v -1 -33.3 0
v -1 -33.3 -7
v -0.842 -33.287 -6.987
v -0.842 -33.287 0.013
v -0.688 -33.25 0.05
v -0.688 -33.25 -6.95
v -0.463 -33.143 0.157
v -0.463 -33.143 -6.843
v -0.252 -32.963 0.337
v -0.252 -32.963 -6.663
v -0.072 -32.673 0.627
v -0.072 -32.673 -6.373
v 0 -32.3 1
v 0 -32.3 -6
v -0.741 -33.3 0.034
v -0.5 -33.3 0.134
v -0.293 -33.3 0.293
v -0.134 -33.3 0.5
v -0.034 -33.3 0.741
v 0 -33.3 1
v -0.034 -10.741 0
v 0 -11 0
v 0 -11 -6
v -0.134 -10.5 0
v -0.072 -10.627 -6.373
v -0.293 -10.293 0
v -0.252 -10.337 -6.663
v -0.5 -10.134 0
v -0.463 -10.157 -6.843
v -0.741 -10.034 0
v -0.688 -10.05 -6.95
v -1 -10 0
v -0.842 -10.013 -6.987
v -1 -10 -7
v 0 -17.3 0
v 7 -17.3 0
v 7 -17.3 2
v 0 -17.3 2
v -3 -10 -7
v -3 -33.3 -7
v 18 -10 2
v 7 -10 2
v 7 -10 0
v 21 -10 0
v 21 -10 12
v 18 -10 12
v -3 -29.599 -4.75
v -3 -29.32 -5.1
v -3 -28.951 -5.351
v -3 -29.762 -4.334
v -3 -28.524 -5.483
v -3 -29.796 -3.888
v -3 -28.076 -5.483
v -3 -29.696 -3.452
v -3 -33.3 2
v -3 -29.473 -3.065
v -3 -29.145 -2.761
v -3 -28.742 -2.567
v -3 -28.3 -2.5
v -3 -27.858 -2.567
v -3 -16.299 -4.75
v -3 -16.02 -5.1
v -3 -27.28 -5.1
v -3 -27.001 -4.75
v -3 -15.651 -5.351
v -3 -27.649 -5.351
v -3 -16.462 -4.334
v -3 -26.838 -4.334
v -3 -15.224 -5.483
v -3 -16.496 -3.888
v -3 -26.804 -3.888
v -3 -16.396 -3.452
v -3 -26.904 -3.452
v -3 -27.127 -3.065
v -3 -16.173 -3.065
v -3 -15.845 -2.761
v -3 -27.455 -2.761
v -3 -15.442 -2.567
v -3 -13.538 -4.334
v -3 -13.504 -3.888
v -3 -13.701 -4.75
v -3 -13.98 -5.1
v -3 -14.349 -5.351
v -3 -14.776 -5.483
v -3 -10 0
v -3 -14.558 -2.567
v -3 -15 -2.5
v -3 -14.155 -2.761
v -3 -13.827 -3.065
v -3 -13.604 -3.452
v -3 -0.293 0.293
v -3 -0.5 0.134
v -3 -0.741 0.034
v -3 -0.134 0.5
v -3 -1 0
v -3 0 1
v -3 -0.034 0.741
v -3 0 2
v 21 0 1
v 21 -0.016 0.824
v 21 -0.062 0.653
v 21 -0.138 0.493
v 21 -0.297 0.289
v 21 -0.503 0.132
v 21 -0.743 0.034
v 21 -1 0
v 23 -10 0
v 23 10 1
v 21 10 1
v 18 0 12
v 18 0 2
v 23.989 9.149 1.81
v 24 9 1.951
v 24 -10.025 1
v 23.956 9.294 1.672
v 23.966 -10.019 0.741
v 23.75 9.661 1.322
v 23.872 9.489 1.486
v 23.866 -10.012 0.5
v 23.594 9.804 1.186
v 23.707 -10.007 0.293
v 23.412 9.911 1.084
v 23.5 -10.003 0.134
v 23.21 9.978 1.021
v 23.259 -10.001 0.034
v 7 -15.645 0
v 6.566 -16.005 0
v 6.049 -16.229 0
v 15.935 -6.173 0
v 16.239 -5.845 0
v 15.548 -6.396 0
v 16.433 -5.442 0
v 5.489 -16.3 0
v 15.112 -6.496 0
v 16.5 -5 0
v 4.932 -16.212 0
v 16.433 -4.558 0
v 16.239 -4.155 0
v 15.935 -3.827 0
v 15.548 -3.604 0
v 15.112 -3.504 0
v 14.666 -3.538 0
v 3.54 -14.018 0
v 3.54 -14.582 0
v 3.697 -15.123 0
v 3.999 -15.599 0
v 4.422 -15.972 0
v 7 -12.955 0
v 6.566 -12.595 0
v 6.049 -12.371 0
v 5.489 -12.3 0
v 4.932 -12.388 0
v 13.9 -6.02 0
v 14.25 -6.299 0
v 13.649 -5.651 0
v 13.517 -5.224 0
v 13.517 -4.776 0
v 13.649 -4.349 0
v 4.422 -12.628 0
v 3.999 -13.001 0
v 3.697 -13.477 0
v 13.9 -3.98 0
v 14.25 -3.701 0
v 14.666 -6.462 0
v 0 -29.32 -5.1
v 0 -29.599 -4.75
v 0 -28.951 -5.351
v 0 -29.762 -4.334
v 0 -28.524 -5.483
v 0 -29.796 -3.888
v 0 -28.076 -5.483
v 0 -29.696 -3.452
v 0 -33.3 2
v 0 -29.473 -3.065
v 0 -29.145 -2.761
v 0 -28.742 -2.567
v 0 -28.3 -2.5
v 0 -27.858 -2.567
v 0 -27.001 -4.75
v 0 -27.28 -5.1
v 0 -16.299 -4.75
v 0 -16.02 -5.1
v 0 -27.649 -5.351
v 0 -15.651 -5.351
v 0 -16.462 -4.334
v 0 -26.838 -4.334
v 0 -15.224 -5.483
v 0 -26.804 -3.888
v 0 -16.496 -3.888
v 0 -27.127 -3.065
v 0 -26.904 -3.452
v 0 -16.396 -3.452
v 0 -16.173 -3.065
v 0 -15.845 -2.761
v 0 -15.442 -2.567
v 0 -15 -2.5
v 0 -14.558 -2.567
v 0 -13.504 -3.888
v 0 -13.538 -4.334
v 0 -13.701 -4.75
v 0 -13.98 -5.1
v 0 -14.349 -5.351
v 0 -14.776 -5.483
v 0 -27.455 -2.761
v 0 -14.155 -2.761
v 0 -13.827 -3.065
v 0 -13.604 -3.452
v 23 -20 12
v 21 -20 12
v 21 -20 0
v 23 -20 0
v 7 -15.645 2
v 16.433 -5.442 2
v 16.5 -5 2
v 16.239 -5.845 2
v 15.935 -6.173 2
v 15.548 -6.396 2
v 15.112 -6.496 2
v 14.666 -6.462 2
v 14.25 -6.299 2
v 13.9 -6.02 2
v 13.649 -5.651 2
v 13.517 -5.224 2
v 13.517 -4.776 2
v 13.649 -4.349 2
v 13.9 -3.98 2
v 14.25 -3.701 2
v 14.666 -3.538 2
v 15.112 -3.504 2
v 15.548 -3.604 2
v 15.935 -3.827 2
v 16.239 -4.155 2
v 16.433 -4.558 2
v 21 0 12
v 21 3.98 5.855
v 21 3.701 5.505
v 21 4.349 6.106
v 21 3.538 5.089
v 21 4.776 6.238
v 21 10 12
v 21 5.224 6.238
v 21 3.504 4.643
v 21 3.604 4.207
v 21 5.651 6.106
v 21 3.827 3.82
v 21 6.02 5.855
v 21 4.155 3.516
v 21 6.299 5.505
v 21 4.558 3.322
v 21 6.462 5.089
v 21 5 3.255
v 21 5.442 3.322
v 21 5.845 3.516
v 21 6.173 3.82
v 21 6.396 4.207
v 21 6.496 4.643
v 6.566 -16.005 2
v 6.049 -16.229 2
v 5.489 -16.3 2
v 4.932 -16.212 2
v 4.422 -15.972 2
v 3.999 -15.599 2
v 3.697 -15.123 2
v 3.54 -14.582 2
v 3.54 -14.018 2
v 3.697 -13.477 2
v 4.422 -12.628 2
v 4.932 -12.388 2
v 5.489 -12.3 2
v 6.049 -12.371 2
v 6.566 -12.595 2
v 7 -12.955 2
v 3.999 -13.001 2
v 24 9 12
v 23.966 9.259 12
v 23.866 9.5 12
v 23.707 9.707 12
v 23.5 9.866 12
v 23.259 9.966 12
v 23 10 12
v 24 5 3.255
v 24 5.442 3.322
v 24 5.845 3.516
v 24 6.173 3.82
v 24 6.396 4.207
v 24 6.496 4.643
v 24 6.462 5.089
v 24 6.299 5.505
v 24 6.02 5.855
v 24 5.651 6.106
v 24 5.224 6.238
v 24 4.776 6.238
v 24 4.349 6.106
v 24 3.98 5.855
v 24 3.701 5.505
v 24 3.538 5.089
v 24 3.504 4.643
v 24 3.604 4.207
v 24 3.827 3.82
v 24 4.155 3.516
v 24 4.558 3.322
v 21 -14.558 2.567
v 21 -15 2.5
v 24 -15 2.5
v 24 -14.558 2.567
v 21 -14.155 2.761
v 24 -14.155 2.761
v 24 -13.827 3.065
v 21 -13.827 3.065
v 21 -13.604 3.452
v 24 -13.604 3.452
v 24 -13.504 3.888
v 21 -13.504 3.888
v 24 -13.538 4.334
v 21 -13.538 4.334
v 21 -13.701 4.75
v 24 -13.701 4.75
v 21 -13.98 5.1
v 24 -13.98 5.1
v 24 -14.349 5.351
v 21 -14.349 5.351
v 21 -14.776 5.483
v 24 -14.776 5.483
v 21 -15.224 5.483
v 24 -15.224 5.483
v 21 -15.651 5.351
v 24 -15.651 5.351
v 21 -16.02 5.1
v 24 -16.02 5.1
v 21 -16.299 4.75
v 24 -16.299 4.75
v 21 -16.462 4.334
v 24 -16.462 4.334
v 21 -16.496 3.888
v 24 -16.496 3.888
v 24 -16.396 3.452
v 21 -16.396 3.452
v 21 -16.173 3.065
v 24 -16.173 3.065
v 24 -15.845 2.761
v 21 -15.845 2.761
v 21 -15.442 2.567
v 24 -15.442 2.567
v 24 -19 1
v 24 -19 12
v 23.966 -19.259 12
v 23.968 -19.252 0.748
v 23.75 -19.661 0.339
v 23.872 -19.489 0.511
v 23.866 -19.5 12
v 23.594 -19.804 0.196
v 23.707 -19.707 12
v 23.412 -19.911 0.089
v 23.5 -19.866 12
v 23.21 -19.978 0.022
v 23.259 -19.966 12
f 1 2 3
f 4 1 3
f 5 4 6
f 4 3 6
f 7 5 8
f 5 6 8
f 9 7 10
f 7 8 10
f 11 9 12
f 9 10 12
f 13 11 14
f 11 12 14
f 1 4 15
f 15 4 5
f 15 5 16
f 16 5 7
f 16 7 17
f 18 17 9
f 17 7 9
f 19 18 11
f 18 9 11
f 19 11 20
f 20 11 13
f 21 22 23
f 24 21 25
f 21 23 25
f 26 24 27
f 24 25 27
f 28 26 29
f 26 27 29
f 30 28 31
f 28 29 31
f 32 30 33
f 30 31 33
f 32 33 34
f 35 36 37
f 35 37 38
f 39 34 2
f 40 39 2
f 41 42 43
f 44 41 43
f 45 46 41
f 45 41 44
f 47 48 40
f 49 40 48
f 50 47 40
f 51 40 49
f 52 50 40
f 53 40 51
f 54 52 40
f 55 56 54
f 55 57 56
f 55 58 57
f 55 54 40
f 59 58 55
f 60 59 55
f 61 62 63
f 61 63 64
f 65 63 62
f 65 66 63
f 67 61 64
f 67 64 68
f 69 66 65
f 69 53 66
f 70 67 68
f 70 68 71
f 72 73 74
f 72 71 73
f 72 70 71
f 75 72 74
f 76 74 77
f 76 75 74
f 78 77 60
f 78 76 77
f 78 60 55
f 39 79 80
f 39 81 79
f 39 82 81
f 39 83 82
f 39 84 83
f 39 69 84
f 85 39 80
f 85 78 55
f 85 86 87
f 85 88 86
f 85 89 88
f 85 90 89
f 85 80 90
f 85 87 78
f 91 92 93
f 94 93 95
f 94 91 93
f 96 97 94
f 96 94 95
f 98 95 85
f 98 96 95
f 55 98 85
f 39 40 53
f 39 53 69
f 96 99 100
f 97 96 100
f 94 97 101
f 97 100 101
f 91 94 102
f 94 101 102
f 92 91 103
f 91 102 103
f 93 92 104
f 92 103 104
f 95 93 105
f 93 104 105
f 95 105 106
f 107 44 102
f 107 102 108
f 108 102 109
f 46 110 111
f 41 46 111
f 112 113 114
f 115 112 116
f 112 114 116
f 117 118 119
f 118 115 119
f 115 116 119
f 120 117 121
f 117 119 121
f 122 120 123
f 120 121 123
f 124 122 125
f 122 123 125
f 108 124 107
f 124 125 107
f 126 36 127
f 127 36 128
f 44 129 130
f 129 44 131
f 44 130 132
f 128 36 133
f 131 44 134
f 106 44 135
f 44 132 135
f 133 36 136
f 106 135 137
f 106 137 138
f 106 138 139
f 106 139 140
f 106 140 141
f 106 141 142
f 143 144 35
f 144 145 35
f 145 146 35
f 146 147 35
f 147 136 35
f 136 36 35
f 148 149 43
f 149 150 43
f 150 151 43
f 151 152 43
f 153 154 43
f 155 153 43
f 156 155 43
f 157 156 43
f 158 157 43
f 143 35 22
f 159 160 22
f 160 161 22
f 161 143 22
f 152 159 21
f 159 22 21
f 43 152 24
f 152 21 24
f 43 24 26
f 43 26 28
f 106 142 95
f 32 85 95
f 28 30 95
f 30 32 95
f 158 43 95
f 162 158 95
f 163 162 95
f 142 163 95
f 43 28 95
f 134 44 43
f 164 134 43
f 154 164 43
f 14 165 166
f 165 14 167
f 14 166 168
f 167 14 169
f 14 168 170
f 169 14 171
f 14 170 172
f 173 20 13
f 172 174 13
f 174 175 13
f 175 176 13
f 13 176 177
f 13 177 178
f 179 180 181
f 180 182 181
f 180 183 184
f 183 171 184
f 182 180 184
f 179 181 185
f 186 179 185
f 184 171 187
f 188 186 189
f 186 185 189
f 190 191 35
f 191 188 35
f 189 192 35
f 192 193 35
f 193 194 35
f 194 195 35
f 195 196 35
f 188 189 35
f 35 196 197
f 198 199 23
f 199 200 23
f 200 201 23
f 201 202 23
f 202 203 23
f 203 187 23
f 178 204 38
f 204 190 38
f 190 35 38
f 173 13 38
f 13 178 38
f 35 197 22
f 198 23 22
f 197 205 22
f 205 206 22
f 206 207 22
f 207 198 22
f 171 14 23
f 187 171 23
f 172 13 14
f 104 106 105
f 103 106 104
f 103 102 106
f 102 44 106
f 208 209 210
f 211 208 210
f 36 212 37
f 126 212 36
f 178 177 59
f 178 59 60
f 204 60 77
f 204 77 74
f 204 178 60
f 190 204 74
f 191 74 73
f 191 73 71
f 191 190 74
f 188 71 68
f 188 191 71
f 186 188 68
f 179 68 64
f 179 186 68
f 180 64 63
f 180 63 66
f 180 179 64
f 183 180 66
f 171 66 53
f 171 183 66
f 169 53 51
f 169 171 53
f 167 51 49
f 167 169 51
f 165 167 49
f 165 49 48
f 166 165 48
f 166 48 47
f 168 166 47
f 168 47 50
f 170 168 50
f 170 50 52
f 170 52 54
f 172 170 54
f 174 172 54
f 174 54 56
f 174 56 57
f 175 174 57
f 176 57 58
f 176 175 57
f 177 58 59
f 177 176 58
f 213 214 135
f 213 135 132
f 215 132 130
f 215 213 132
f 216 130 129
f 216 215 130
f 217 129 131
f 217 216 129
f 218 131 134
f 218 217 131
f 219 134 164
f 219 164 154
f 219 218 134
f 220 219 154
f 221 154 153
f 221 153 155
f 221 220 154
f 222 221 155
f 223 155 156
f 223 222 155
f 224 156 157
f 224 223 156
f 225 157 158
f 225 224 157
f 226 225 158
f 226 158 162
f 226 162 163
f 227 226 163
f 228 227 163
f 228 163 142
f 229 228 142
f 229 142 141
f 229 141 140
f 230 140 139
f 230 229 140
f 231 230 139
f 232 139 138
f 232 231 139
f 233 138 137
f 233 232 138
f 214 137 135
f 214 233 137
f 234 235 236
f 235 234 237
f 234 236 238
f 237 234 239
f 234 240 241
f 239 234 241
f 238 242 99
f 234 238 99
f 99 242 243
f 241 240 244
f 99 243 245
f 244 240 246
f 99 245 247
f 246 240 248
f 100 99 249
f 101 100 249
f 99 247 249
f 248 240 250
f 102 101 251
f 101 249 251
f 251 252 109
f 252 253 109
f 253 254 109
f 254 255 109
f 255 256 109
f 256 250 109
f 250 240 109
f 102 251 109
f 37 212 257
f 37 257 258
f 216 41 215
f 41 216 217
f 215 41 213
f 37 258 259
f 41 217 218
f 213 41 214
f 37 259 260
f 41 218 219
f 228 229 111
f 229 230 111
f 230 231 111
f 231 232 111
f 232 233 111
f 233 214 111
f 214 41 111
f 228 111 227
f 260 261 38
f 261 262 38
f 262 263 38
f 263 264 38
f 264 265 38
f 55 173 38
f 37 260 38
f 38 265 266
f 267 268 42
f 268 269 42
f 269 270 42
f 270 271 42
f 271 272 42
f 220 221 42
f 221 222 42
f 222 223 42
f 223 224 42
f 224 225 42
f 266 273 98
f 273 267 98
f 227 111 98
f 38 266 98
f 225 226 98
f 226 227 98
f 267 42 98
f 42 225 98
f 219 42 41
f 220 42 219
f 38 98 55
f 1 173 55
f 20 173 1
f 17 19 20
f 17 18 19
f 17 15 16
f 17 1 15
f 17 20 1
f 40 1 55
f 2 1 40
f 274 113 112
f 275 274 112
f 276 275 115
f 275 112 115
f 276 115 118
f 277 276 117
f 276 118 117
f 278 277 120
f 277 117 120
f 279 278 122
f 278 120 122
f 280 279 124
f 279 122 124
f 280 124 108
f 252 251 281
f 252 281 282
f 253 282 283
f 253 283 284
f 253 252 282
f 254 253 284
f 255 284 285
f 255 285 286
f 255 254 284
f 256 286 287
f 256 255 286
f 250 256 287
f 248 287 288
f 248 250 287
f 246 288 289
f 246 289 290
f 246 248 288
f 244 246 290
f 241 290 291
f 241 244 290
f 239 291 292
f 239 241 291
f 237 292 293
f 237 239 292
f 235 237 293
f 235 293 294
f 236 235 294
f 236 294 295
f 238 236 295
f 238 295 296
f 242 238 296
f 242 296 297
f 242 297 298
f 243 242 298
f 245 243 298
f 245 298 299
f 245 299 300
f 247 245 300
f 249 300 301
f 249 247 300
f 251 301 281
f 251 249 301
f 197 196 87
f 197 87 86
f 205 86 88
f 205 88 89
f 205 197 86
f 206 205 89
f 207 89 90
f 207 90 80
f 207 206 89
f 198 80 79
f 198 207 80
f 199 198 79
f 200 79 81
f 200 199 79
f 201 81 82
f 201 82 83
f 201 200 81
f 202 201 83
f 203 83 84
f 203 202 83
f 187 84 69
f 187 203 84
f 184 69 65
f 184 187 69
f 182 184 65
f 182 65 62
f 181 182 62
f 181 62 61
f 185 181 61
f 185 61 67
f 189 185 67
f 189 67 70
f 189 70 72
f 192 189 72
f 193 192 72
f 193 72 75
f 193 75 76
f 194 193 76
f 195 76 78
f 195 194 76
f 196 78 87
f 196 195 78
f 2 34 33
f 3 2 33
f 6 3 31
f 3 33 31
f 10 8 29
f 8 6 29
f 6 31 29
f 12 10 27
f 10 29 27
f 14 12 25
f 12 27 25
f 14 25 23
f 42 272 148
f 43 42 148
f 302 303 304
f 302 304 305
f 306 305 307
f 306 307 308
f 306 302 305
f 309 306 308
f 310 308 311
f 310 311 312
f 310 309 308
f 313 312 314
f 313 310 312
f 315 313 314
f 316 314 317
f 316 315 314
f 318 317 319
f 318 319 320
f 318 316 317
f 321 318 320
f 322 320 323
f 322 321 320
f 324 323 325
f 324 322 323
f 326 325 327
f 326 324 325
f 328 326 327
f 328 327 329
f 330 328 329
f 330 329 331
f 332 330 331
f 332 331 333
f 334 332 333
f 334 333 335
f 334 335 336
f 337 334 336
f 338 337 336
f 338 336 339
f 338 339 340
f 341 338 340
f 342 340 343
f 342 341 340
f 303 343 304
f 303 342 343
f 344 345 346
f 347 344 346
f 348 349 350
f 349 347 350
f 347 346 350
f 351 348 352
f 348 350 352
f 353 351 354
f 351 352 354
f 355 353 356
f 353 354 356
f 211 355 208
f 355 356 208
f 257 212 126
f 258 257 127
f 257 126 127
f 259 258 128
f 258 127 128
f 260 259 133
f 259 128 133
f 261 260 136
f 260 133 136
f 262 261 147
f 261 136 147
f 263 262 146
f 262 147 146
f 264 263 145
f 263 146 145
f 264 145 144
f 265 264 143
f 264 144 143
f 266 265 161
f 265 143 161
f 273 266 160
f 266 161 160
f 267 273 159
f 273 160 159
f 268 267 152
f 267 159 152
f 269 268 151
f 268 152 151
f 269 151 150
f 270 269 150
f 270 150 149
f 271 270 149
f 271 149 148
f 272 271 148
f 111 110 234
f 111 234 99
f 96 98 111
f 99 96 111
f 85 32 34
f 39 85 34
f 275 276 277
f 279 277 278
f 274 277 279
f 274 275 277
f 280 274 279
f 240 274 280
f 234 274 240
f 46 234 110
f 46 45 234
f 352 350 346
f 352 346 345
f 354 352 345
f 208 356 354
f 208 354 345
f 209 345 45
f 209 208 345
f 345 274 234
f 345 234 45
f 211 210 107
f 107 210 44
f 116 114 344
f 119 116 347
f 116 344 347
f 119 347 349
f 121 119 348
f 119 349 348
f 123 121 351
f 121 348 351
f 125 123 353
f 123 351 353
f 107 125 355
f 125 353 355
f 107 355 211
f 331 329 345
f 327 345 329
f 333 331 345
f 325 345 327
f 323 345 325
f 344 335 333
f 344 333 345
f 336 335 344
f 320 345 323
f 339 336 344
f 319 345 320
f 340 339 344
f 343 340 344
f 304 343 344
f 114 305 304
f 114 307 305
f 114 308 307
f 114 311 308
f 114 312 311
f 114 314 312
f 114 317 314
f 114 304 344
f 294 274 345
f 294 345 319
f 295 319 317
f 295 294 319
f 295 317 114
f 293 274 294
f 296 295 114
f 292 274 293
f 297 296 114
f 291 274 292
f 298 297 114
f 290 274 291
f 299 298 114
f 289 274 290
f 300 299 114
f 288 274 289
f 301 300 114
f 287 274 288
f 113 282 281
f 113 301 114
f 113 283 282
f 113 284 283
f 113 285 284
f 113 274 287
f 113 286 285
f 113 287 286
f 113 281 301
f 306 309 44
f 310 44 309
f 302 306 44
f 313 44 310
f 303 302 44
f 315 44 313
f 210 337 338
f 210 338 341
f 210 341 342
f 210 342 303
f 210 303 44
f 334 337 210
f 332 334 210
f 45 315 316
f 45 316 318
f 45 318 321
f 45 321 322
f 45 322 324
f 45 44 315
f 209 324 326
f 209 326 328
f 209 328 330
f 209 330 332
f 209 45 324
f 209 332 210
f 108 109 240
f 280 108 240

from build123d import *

# Parameters (mm, degrees)
CROQUIS1_W              = 24
CROQUIS1_H              = 33.3
SALIENTE_EXTRUIR2_DEPTH = 7
CROQUIS3_W              = 4
CROQUIS3_H              = 19
CORTAR_EXTRUIR1_DEPTH   = 42.640004803
CROQUIS7_R              = 1.5
SALIENTE_EXTRUIR3_DEPTH = 3
CROQUIS8_W              = 18
CROQUIS8_H              = 10
CROQUIS8_R              = 1.5
SALIENTE_EXTRUIR5_DEPTH = 3
SALIENTE_EXTRUIR6_START = -2
CROQUIS9_W              = 18
CROQUIS9_H              = 10
CROQUIS9_R              = 1.5
SALIENTE_EXTRUIR6_DEPTH = 2
CROQUIS10_W             = 24
CROQUIS10_H             = 10
SALIENTE_EXTRUIR7_DEPTH = 3
CROQUIS11_W             = 19
CROQUIS11_H             = 38
CORTAR_EXTRUIR5_DEPTH   = 57.986752847
CROQUIS15_W             = 7
CROQUIS15_H             = 10
CORTAR_EXTRUIR8_DEPTH   = 59.004223984
CROQUIS16_W             = 7
CROQUIS16_H             = 16
CORTAR_EXTRUIR9_DEPTH   = 2
CROQUIS18_R             = 1.5
CROQUIS18_W             = 24
CROQUIS18_H             = 10
SALIENTE_EXTRUIR8_DEPTH = 3
REDONDEO1_R             = 1
CROQUIS19_W             = 27
CROQUIS19_H             = 19
CORTAR_EXTRUIR11_DEPTH  = 67.973800848
CROQUIS21_R             = 2
CORTAR_EXTRUIR12_DEPTH  = 10
CROQUIS22_W             = 12
CROQUIS22_H             = 11
CORTAR_EXTRUIR13_DEPTH  = 52.792760112


with BuildPart() as part:
    # Croquis1 → Saliente-Extruir2 (new body)
    with BuildSketch(Plane(origin=(0, 0, 0), x_dir=(0, 0, -1), z_dir=(1, 0, 0))):
        with Locations((-12, -16.65)):
            Rectangle(CROQUIS1_W, CROQUIS1_H)
    extrude(amount=SALIENTE_EXTRUIR2_DEPTH)

    # Croquis3 → Cortar-Extruir1 (cut, through all)
    with BuildSketch(Plane(origin=(0, 0, 0), x_dir=(1, 0, 0), z_dir=(0, 1, 0))):
        with Locations((5, -11.5)):
            Rectangle(CROQUIS3_W, CROQUIS3_H)
    extrude(amount=-CORTAR_EXTRUIR1_DEPTH, mode=Mode.SUBTRACT)



with BuildPart() as body_2:
    # Croquis7 → Saliente-Extruir3 (new body)
    with BuildSketch(Plane.ZY):
        Polygon((-7, 0), (-7, -33.3), (0, -33.3), (0, -44.3), (24, -44.3), (24, -33.3), (31, -33.3), (31, 0), align=None)
        with Locations((-4, -28.3)):
            Circle(CROQUIS7_R, mode=Mode.SUBTRACT)
        with Locations((-4, -15)):
            Circle(CROQUIS7_R, mode=Mode.SUBTRACT)
        with Locations((28, -15)):
            Circle(CROQUIS7_R, mode=Mode.SUBTRACT)
        with Locations((28, -28.3)):
            Circle(CROQUIS7_R, mode=Mode.SUBTRACT)
        with Locations((20, -40.3)):
            Circle(CROQUIS7_R, mode=Mode.SUBTRACT)
        with Locations((4, -40.3)):
            Circle(CROQUIS7_R, mode=Mode.SUBTRACT)
    extrude(amount=SALIENTE_EXTRUIR3_DEPTH)


with BuildPart() as part_1:
    add(part.part)

    add(body_2.part)  # Saliente-Extruir5 merges body 2
    # Croquis8 → Saliente-Extruir5 (add)
    with BuildSketch(Plane.XY.offset(24)):
        with Locations((9, -5)):
            Rectangle(CROQUIS8_W, CROQUIS8_H)
        with Locations((15, -5)):
            Circle(CROQUIS8_R, mode=Mode.SUBTRACT)
        with Locations((3, -5)):
            Circle(CROQUIS8_R, mode=Mode.SUBTRACT)
    extrude(amount=-SALIENTE_EXTRUIR5_DEPTH)

    # Croquis9 → Saliente-Extruir6 (add)
    with BuildSketch(Plane(origin=(0, 0, 0), x_dir=(-1, 0, 0), z_dir=(0, 0, -1)).offset(SALIENTE_EXTRUIR6_START)):
        with Locations((-9, -5)):
            Rectangle(CROQUIS9_W, CROQUIS9_H)
        with Locations(Location((-15, -5, 0), (0, 0, 180))):
            Circle(CROQUIS9_R, mode=Mode.SUBTRACT)
    extrude(amount=SALIENTE_EXTRUIR6_DEPTH)

    # Croquis10 → Saliente-Extruir7 (add)
    with BuildSketch(Plane(origin=(18, 0, 0), x_dir=(0, 0, -1), z_dir=(1, 0, 0))):
        with Locations((-12, -5)):
            Rectangle(CROQUIS10_W, CROQUIS10_H)
    extrude(amount=SALIENTE_EXTRUIR7_DEPTH)

    # Croquis11 → Cortar-Extruir5 (cut, through all)
    with BuildSketch(Plane(origin=(3, 0, 0), x_dir=(0, 0, -1), z_dir=(1, 0, 0))):
        with Locations((-11.5, -19)):
            Rectangle(CROQUIS11_W, CROQUIS11_H)
    extrude(amount=-CORTAR_EXTRUIR5_DEPTH, mode=Mode.SUBTRACT)

    # Croquis15 → Cortar-Extruir8 (cut, through all)
    with BuildSketch(Plane(origin=(0, 0, 0), x_dir=(0, 0, -1), z_dir=(1, 0, 0))):
        with Locations((-27.5, -5)):
            Rectangle(CROQUIS15_W, CROQUIS15_H)
        with Locations((3.5, -5)):
            Rectangle(CROQUIS15_W, CROQUIS15_H)
    extrude(amount=-CORTAR_EXTRUIR8_DEPTH, mode=Mode.SUBTRACT)

    # Croquis16 → Cortar-Extruir9 (cut)
    with BuildSketch(Plane(origin=(0, 0, 0), x_dir=(-1, 0, 0), z_dir=(0, 0, -1))):
        with Locations((-3.5, -25.3)):
            Rectangle(CROQUIS16_W, CROQUIS16_H)
    extrude(amount=-CORTAR_EXTRUIR9_DEPTH, mode=Mode.SUBTRACT)

    # Croquis18 → Saliente-Extruir8 (add)
    # profile 1 of 2: a face of its own
    with BuildSketch(Plane(origin=(21, 0, 0), x_dir=(0, 0, -1), z_dir=(1, 0, 0))):
        Polygon((-24, 10), (-24, -10), (0, -10), (-1, 10), align=None)
        with Locations((-20, 5)):
            Circle(CROQUIS18_R, mode=Mode.SUBTRACT)
        with Locations((-4.754996879, 5)):
            Circle(CROQUIS18_R, mode=Mode.SUBTRACT)
    # profile 2 of 2: a face of its own
    with BuildSketch(Plane(origin=(21, 0, 0), x_dir=(0, 0, -1), z_dir=(1, 0, 0))):
        with Locations((-12, -15)):
            Rectangle(CROQUIS18_W, CROQUIS18_H)
        with Locations((-20, -15)):
            Circle(CROQUIS18_R, mode=Mode.SUBTRACT)
        with Locations((-4, -15)):
            Circle(CROQUIS18_R, mode=Mode.SUBTRACT)
    extrude(amount=SALIENTE_EXTRUIR8_DEPTH)

    # Redondeo1
    # the kernel refuses this fillet: 1 mm, written as the material it takes off along each edge
    with BuildSketch(Plane(origin=(0, -33.3, 31), x_dir=(0, 0, -1), z_dir=(0, 1, 0)), Plane(origin=(0, -10, -7), x_dir=(0, 0, 1), z_dir=(0, -1, 0))) as redondeo1_piece_1:
        with BuildLine():
            CenterArc((REDONDEO1_R, REDONDEO1_R), REDONDEO1_R, 180, 90)
            Line((0, REDONDEO1_R), (-REDONDEO1_R * 0.02, REDONDEO1_R))
            Line((-REDONDEO1_R * 0.02, REDONDEO1_R), (-REDONDEO1_R * 0.02, -REDONDEO1_R * 0.02))
            Line((-REDONDEO1_R * 0.02, -REDONDEO1_R * 0.02), (REDONDEO1_R, -REDONDEO1_R * 0.02))
            Line((REDONDEO1_R, -REDONDEO1_R * 0.02), (REDONDEO1_R, 0))
        make_face()
    extrude(amount=23.3, mode=Mode.SUBTRACT)
    with BuildSketch(Plane(origin=(0, -10, 24), x_dir=(-1, 0, 0), z_dir=(0, 0, 1)), Plane(origin=(0, -10, -7), x_dir=(-1, 0, 0), z_dir=(0, 0, 1)), Plane(origin=(0, -33.3, 24), x_dir=(0, 1, 0), z_dir=(0, 0, 1)), Plane(origin=(0, -33.3, -7), x_dir=(0, 1, 0), z_dir=(0, 0, 1))) as redondeo1_piece_2:
        with BuildLine():
            CenterArc((REDONDEO1_R, REDONDEO1_R), REDONDEO1_R, 180, 90)
            Line((0, REDONDEO1_R), (-REDONDEO1_R * 0.02, REDONDEO1_R))
            Line((-REDONDEO1_R * 0.02, REDONDEO1_R), (-REDONDEO1_R * 0.02, -REDONDEO1_R * 0.02))
            Line((-REDONDEO1_R * 0.02, -REDONDEO1_R * 0.02), (REDONDEO1_R, -REDONDEO1_R * 0.02))
            Line((REDONDEO1_R, -REDONDEO1_R * 0.02), (REDONDEO1_R, 0))
        make_face()
    extrude(amount=7, mode=Mode.SUBTRACT)
    with BuildSketch(Plane(origin=(24, -20, 24), x_dir=(-1, 0, 0), z_dir=(0, 1, 0))) as redondeo1_piece_3:
        with BuildLine():
            CenterArc((REDONDEO1_R, -REDONDEO1_R), REDONDEO1_R, 90, 90)
            Line((0, -REDONDEO1_R), (-REDONDEO1_R * 0.02, -REDONDEO1_R))
            Line((-REDONDEO1_R * 0.02, -REDONDEO1_R), (-REDONDEO1_R * 0.02, REDONDEO1_R * 0.02))
            Line((-REDONDEO1_R * 0.02, REDONDEO1_R * 0.02), (REDONDEO1_R, REDONDEO1_R * 0.02))
            Line((REDONDEO1_R, REDONDEO1_R * 0.02), (REDONDEO1_R, 0))
        make_face()
    extrude(amount=30, mode=Mode.SUBTRACT)
    with BuildSketch(Plane(origin=(24, -20, 0), x_dir=(0, 0, 1), z_dir=(0, 1, 0))) as redondeo1_piece_4_section:
        with BuildLine():
            CenterArc((REDONDEO1_R, -REDONDEO1_R), REDONDEO1_R, 90, 90)
            Line((0, -REDONDEO1_R), (-REDONDEO1_R * 0.02, -REDONDEO1_R))
            Line((-REDONDEO1_R * 0.02, -REDONDEO1_R), (-REDONDEO1_R * 0.02, REDONDEO1_R * 0.02))
            Line((-REDONDEO1_R * 0.02, REDONDEO1_R * 0.02), (REDONDEO1_R, REDONDEO1_R * 0.02))
            Line((REDONDEO1_R, REDONDEO1_R * 0.02), (REDONDEO1_R, 0))
        make_face()
    redondeo1_piece_4 = extrude(amount=12.5, mode=Mode.PRIVATE)
    redondeo1_piece_4 = split(redondeo1_piece_4, bisect_by=Plane(origin=(23.783903018, -14.02846616, -0.201423308), z_dir=(0, -0.049937616943892635, 0.9987523388778446)), keep=Keep.TOP, mode=Mode.PRIVATE)
    add(redondeo1_piece_4, mode=Mode.SUBTRACT)
    with BuildSketch(Plane(origin=(24, 10, -1.5), x_dir=(-1, 0, 0), z_dir=(0, 0, 1))) as redondeo1_piece_5_section:
        with BuildLine():
            CenterArc((REDONDEO1_R, REDONDEO1_R), REDONDEO1_R, 180, 90)
            Line((0, REDONDEO1_R), (-REDONDEO1_R * 0.02, REDONDEO1_R))
            Line((-REDONDEO1_R * 0.02, REDONDEO1_R), (-REDONDEO1_R * 0.02, -REDONDEO1_R * 0.02))
            Line((-REDONDEO1_R * 0.02, -REDONDEO1_R * 0.02), (REDONDEO1_R, -REDONDEO1_R * 0.02))
            Line((REDONDEO1_R, -REDONDEO1_R * 0.02), (REDONDEO1_R, 0))
        make_face()
    redondeo1_piece_5 = extrude(amount=25.5, mode=Mode.PRIVATE)
    redondeo1_piece_5 = split(redondeo1_piece_5, bisect_by=Plane(origin=(23.773664545, 10.347352398, 1.01736762), z_dir=(0, -0.049937616943892635, 0.9987523388778446)), keep=Keep.TOP, mode=Mode.PRIVATE)
    add(redondeo1_piece_5, mode=Mode.SUBTRACT)
    with BuildSketch(Plane(origin=(24, -20, 24), x_dir=(0, 1, 0), z_dir=(0, 0, -1)), Plane(origin=(-3, 0, 24), x_dir=(0, 0, -1), z_dir=(1, 0, 0)), Plane(origin=(21, 0, 0), x_dir=(0, 0, 1), z_dir=(-1, 0, 0))) as redondeo1_piece_6:
        with BuildLine():
            CenterArc((REDONDEO1_R, -REDONDEO1_R), REDONDEO1_R, 90, 90)
            Line((0, -REDONDEO1_R), (-REDONDEO1_R * 0.02, -REDONDEO1_R))
            Line((-REDONDEO1_R * 0.02, -REDONDEO1_R), (-REDONDEO1_R * 0.02, REDONDEO1_R * 0.02))
            Line((-REDONDEO1_R * 0.02, REDONDEO1_R * 0.02), (REDONDEO1_R, REDONDEO1_R * 0.02))
            Line((REDONDEO1_R, REDONDEO1_R * 0.02), (REDONDEO1_R, 0))
        make_face()
    extrude(amount=24, mode=Mode.SUBTRACT)
    with BuildSketch(Plane(origin=(24, -12.496880847, -0.124844042), x_dir=(-1, 0, 0), z_dir=(0, 0.9987523388778446, 0.049937616943892635))) as redondeo1_piece_7_section:
        with BuildLine():
            CenterArc((REDONDEO1_R, REDONDEO1_R), REDONDEO1_R, 180, 90)
            Line((0, REDONDEO1_R), (-REDONDEO1_R * 0.02, REDONDEO1_R))
            Line((-REDONDEO1_R * 0.02, REDONDEO1_R), (-REDONDEO1_R * 0.02, -REDONDEO1_R * 0.02))
            Line((-REDONDEO1_R * 0.02, -REDONDEO1_R * 0.02), (REDONDEO1_R, -REDONDEO1_R * 0.02))
            Line((REDONDEO1_R, -REDONDEO1_R * 0.02), (REDONDEO1_R, 0))
        make_face()
    redondeo1_piece_7 = extrude(amount=25.024984395, mode=Mode.PRIVATE)
    redondeo1_piece_7 = split(redondeo1_piece_7, bisect_by=Plane(origin=(23.779237021, -0.936247577, 0), z_dir=(0, 0, 1)), keep=Keep.TOP, mode=Mode.PRIVATE)
    redondeo1_piece_7 = split(redondeo1_piece_7, bisect_by=Plane(origin=(23.779237021, 10, 0.686324779), z_dir=(0, -1, 0)), keep=Keep.TOP, mode=Mode.PRIVATE)
    add(redondeo1_piece_7, mode=Mode.SUBTRACT)
    with BuildSketch(Plane(origin=(7, -33.3, 24), x_dir=(-1, 0, 0), z_dir=(0, 1, 0))) as redondeo1_piece_8:
        with BuildLine():
            CenterArc((REDONDEO1_R, -REDONDEO1_R), REDONDEO1_R, 90, 90)
            Line((0, -REDONDEO1_R), (-REDONDEO1_R * 0.02, -REDONDEO1_R))
            Line((-REDONDEO1_R * 0.02, -REDONDEO1_R), (-REDONDEO1_R * 0.02, REDONDEO1_R * 0.02))
            Line((-REDONDEO1_R * 0.02, REDONDEO1_R * 0.02), (REDONDEO1_R, REDONDEO1_R * 0.02))
            Line((REDONDEO1_R, REDONDEO1_R * 0.02), (REDONDEO1_R, 0))
        make_face()
    extrude(amount=23.3, mode=Mode.SUBTRACT)
    with BuildSketch(Plane(origin=(7, -10, 24), x_dir=(0, 1, 0), z_dir=(1, 0, 0))) as redondeo1_piece_9:
        with BuildLine():
            CenterArc((REDONDEO1_R, -REDONDEO1_R), REDONDEO1_R, 90, 90)
            Line((0, -REDONDEO1_R), (-REDONDEO1_R * 0.02, -REDONDEO1_R))
            Line((-REDONDEO1_R * 0.02, -REDONDEO1_R), (-REDONDEO1_R * 0.02, REDONDEO1_R * 0.02))
            Line((-REDONDEO1_R * 0.02, REDONDEO1_R * 0.02), (REDONDEO1_R, REDONDEO1_R * 0.02))
            Line((REDONDEO1_R, REDONDEO1_R * 0.02), (REDONDEO1_R, 0))
        make_face()
    extrude(amount=14, mode=Mode.SUBTRACT)
    with BuildSketch(Plane(origin=(0, -33.3, 0), x_dir=(0, 0, 1), z_dir=(0, -1, 0))) as redondeo1_piece_10:
        with BuildLine():
            CenterArc((REDONDEO1_R, REDONDEO1_R), REDONDEO1_R, 180, 90)
            Line((0, REDONDEO1_R), (-REDONDEO1_R * 0.02, REDONDEO1_R))
            Line((-REDONDEO1_R * 0.02, REDONDEO1_R), (-REDONDEO1_R * 0.02, -REDONDEO1_R * 0.02))
            Line((-REDONDEO1_R * 0.02, -REDONDEO1_R * 0.02), (REDONDEO1_R, -REDONDEO1_R * 0.02))
            Line((REDONDEO1_R, -REDONDEO1_R * 0.02), (REDONDEO1_R, 0))
        make_face()
    extrude(amount=11, mode=Mode.SUBTRACT)
    with BuildSketch(Plane(origin=(0, -44.3, 0), x_dir=(0, 1, 0), z_dir=(0, 0, 1))) as redondeo1_piece_11:
        with BuildLine():
            CenterArc((REDONDEO1_R, REDONDEO1_R), REDONDEO1_R, 180, 90)
            Line((0, REDONDEO1_R), (-REDONDEO1_R * 0.02, REDONDEO1_R))
            Line((-REDONDEO1_R * 0.02, REDONDEO1_R), (-REDONDEO1_R * 0.02, -REDONDEO1_R * 0.02))
            Line((-REDONDEO1_R * 0.02, -REDONDEO1_R * 0.02), (REDONDEO1_R, -REDONDEO1_R * 0.02))
            Line((REDONDEO1_R, -REDONDEO1_R * 0.02), (REDONDEO1_R, 0))
        make_face()
    extrude(amount=24, mode=Mode.SUBTRACT)
    with BuildSketch(Plane(origin=(0, -35.8, 31), x_dir=(0, 0, -1), z_dir=(0, 1, 0))) as redondeo1_piece_12a_section:
        with BuildLine():
            CenterArc((REDONDEO1_R, REDONDEO1_R), REDONDEO1_R, 180, 90)
            Line((0, REDONDEO1_R), (-REDONDEO1_R * 0.02, REDONDEO1_R))
            Line((-REDONDEO1_R * 0.02, REDONDEO1_R), (-REDONDEO1_R * 0.02, -REDONDEO1_R * 0.02))
            Line((-REDONDEO1_R * 0.02, -REDONDEO1_R * 0.02), (REDONDEO1_R, -REDONDEO1_R * 0.02))
            Line((REDONDEO1_R, -REDONDEO1_R * 0.02), (REDONDEO1_R, 0))
        make_face()
    redondeo1_piece_12a = extrude(amount=25.8, mode=Mode.PRIVATE)
    redondeo1_piece_12a = split(redondeo1_piece_12a, bisect_by=Plane(origin=(-0.226395114, -33.3, 30.773604886), z_dir=(0, -1, 0)), keep=Keep.TOP, mode=Mode.PRIVATE)
    with BuildSketch(Plane(origin=(0, -33.3, 24), x_dir=(0, 1, 0), z_dir=(0, 0, 1))) as redondeo1_piece_12b_section:
        with BuildLine():
            CenterArc((REDONDEO1_R, REDONDEO1_R), REDONDEO1_R, 180, 90)
            Line((0, REDONDEO1_R), (-REDONDEO1_R * 0.02, REDONDEO1_R))
            Line((-REDONDEO1_R * 0.02, REDONDEO1_R), (-REDONDEO1_R * 0.02, -REDONDEO1_R * 0.02))
            Line((-REDONDEO1_R * 0.02, -REDONDEO1_R * 0.02), (REDONDEO1_R, -REDONDEO1_R * 0.02))
            Line((REDONDEO1_R, -REDONDEO1_R * 0.02), (REDONDEO1_R, 0))
        make_face()
    redondeo1_piece_12b = extrude(amount=9.5, mode=Mode.PRIVATE)
    redondeo1_piece_12b = split(redondeo1_piece_12b, bisect_by=Plane(origin=(-0.226395114, -33.073604886, 31), z_dir=(0, 0, 1)), keep=Keep.TOP, mode=Mode.PRIVATE)
    redondeo1_piece_12 = redondeo1_piece_12a & redondeo1_piece_12b
    add(redondeo1_piece_12, mode=Mode.SUBTRACT)
    with BuildSketch(Plane(origin=(0, -10, 24), x_dir=(-1, 0, 0), z_dir=(0, 0, 1))) as redondeo1_piece_13a_section:
        with BuildLine():
            CenterArc((REDONDEO1_R, REDONDEO1_R), REDONDEO1_R, 180, 90)
            Line((0, REDONDEO1_R), (-REDONDEO1_R * 0.02, REDONDEO1_R))
            Line((-REDONDEO1_R * 0.02, REDONDEO1_R), (-REDONDEO1_R * 0.02, -REDONDEO1_R * 0.02))
            Line((-REDONDEO1_R * 0.02, -REDONDEO1_R * 0.02), (REDONDEO1_R, -REDONDEO1_R * 0.02))
            Line((REDONDEO1_R, -REDONDEO1_R * 0.02), (REDONDEO1_R, 0))
        make_face()
    redondeo1_piece_13a = extrude(amount=9.5, mode=Mode.PRIVATE)
    redondeo1_piece_13a = split(redondeo1_piece_13a, bisect_by=Plane(origin=(-0.226395114, -10.226395114, 31), z_dir=(0, 0, 1)), keep=Keep.TOP, mode=Mode.PRIVATE)
    with BuildSketch(Plane(origin=(0, -33.3, 31), x_dir=(0, 0, -1), z_dir=(0, 1, 0))) as redondeo1_piece_13b_section:
        with BuildLine():
            CenterArc((REDONDEO1_R, REDONDEO1_R), REDONDEO1_R, 180, 90)
            Line((0, REDONDEO1_R), (-REDONDEO1_R * 0.02, REDONDEO1_R))
            Line((-REDONDEO1_R * 0.02, REDONDEO1_R), (-REDONDEO1_R * 0.02, -REDONDEO1_R * 0.02))
            Line((-REDONDEO1_R * 0.02, -REDONDEO1_R * 0.02), (REDONDEO1_R, -REDONDEO1_R * 0.02))
            Line((REDONDEO1_R, -REDONDEO1_R * 0.02), (REDONDEO1_R, 0))
        make_face()
    redondeo1_piece_13b = extrude(amount=25.8, mode=Mode.PRIVATE)
    redondeo1_piece_13b = split(redondeo1_piece_13b, bisect_by=Plane(origin=(-0.226395114, -10, 30.773604886), z_dir=(0, 1, 0)), keep=Keep.TOP, mode=Mode.PRIVATE)
    redondeo1_piece_13 = redondeo1_piece_13a & redondeo1_piece_13b
    add(redondeo1_piece_13, mode=Mode.SUBTRACT)
    with BuildSketch(Plane(origin=(0, -10, -9.5), x_dir=(-1, 0, 0), z_dir=(0, 0, 1))) as redondeo1_piece_14a_section:
        with BuildLine():
            CenterArc((REDONDEO1_R, REDONDEO1_R), REDONDEO1_R, 180, 90)
            Line((0, REDONDEO1_R), (-REDONDEO1_R * 0.02, REDONDEO1_R))
            Line((-REDONDEO1_R * 0.02, REDONDEO1_R), (-REDONDEO1_R * 0.02, -REDONDEO1_R * 0.02))
            Line((-REDONDEO1_R * 0.02, -REDONDEO1_R * 0.02), (REDONDEO1_R, -REDONDEO1_R * 0.02))
            Line((REDONDEO1_R, -REDONDEO1_R * 0.02), (REDONDEO1_R, 0))
        make_face()
    redondeo1_piece_14a = extrude(amount=9.5, mode=Mode.PRIVATE)
    redondeo1_piece_14a = split(redondeo1_piece_14a, bisect_by=Plane(origin=(-0.226395114, -10.226395114, -7), z_dir=(0, 0, -1)), keep=Keep.TOP, mode=Mode.PRIVATE)
    with BuildSketch(Plane(origin=(0, -7.5, -7), x_dir=(0, 0, 1), z_dir=(0, -1, 0))) as redondeo1_piece_14b_section:
        with BuildLine():
            CenterArc((REDONDEO1_R, REDONDEO1_R), REDONDEO1_R, 180, 90)
            Line((0, REDONDEO1_R), (-REDONDEO1_R * 0.02, REDONDEO1_R))
            Line((-REDONDEO1_R * 0.02, REDONDEO1_R), (-REDONDEO1_R * 0.02, -REDONDEO1_R * 0.02))
            Line((-REDONDEO1_R * 0.02, -REDONDEO1_R * 0.02), (REDONDEO1_R, -REDONDEO1_R * 0.02))
            Line((REDONDEO1_R, -REDONDEO1_R * 0.02), (REDONDEO1_R, 0))
        make_face()
    redondeo1_piece_14b = extrude(amount=25.8, mode=Mode.PRIVATE)
    redondeo1_piece_14b = split(redondeo1_piece_14b, bisect_by=Plane(origin=(-0.226395114, -10, -6.773604886), z_dir=(0, 1, 0)), keep=Keep.TOP, mode=Mode.PRIVATE)
    redondeo1_piece_14 = redondeo1_piece_14a & redondeo1_piece_14b
    add(redondeo1_piece_14, mode=Mode.SUBTRACT)
    with BuildSketch(Plane(origin=(0, -10, -7), x_dir=(0, 0, 1), z_dir=(0, -1, 0))) as redondeo1_piece_15a_section:
        with BuildLine():
            CenterArc((REDONDEO1_R, REDONDEO1_R), REDONDEO1_R, 180, 90)
            Line((0, REDONDEO1_R), (-REDONDEO1_R * 0.02, REDONDEO1_R))
            Line((-REDONDEO1_R * 0.02, REDONDEO1_R), (-REDONDEO1_R * 0.02, -REDONDEO1_R * 0.02))
            Line((-REDONDEO1_R * 0.02, -REDONDEO1_R * 0.02), (REDONDEO1_R, -REDONDEO1_R * 0.02))
            Line((REDONDEO1_R, -REDONDEO1_R * 0.02), (REDONDEO1_R, 0))
        make_face()
    redondeo1_piece_15a = extrude(amount=25.8, mode=Mode.PRIVATE)
    redondeo1_piece_15a = split(redondeo1_piece_15a, bisect_by=Plane(origin=(-0.226395114, -33.3, -6.773604886), z_dir=(0, -1, 0)), keep=Keep.TOP, mode=Mode.PRIVATE)
    with BuildSketch(Plane(origin=(0, -33.3, -9.5), x_dir=(0, 1, 0), z_dir=(0, 0, 1))) as redondeo1_piece_15b_section:
        with BuildLine():
            CenterArc((REDONDEO1_R, REDONDEO1_R), REDONDEO1_R, 180, 90)
            Line((0, REDONDEO1_R), (-REDONDEO1_R * 0.02, REDONDEO1_R))
            Line((-REDONDEO1_R * 0.02, REDONDEO1_R), (-REDONDEO1_R * 0.02, -REDONDEO1_R * 0.02))
            Line((-REDONDEO1_R * 0.02, -REDONDEO1_R * 0.02), (REDONDEO1_R, -REDONDEO1_R * 0.02))
            Line((REDONDEO1_R, -REDONDEO1_R * 0.02), (REDONDEO1_R, 0))
        make_face()
    redondeo1_piece_15b = extrude(amount=9.5, mode=Mode.PRIVATE)
    redondeo1_piece_15b = split(redondeo1_piece_15b, bisect_by=Plane(origin=(-0.226395114, -33.073604886, -7), z_dir=(0, 0, -1)), keep=Keep.TOP, mode=Mode.PRIVATE)
    redondeo1_piece_15 = redondeo1_piece_15a & redondeo1_piece_15b
    add(redondeo1_piece_15, mode=Mode.SUBTRACT)
    with BuildSketch(Plane(origin=(24, -22.5, 24), x_dir=(-1, 0, 0), z_dir=(0, 1, 0))) as redondeo1_piece_16a_section:
        with BuildLine():
            CenterArc((REDONDEO1_R, -REDONDEO1_R), REDONDEO1_R, 90, 90)
            Line((0, -REDONDEO1_R), (-REDONDEO1_R * 0.02, -REDONDEO1_R))
            Line((-REDONDEO1_R * 0.02, -REDONDEO1_R), (-REDONDEO1_R * 0.02, REDONDEO1_R * 0.02))
            Line((-REDONDEO1_R * 0.02, REDONDEO1_R * 0.02), (REDONDEO1_R, REDONDEO1_R * 0.02))
            Line((REDONDEO1_R, REDONDEO1_R * 0.02), (REDONDEO1_R, 0))
        make_face()
    redondeo1_piece_16a = extrude(amount=32.5, mode=Mode.PRIVATE)
    redondeo1_piece_16a = split(redondeo1_piece_16a, bisect_by=Plane(origin=(23.773604886, -20, 23.773604886), z_dir=(0, -1, 0)), keep=Keep.TOP, mode=Mode.PRIVATE)
    with BuildSketch(Plane(origin=(24, -20, 26.5), x_dir=(0, 1, 0), z_dir=(0, 0, -1))) as redondeo1_piece_16b_section:
        with BuildLine():
            CenterArc((REDONDEO1_R, -REDONDEO1_R), REDONDEO1_R, 90, 90)
            Line((0, -REDONDEO1_R), (-REDONDEO1_R * 0.02, -REDONDEO1_R))
            Line((-REDONDEO1_R * 0.02, -REDONDEO1_R), (-REDONDEO1_R * 0.02, REDONDEO1_R * 0.02))
            Line((-REDONDEO1_R * 0.02, REDONDEO1_R * 0.02), (REDONDEO1_R, REDONDEO1_R * 0.02))
            Line((REDONDEO1_R, REDONDEO1_R * 0.02), (REDONDEO1_R, 0))
        make_face()
    redondeo1_piece_16b = extrude(amount=26.5, mode=Mode.PRIVATE)
    redondeo1_piece_16b = split(redondeo1_piece_16b, bisect_by=Plane(origin=(23.773604886, -19.773604886, 24), z_dir=(0, 0, 1)), keep=Keep.TOP, mode=Mode.PRIVATE)
    redondeo1_piece_16 = redondeo1_piece_16a & redondeo1_piece_16b
    add(redondeo1_piece_16, mode=Mode.SUBTRACT)
    with BuildSketch(Plane(origin=(24, -20, 24), x_dir=(-1, 0, 0), z_dir=(0, 1, 0))) as redondeo1_piece_17a_section:
        with BuildLine():
            CenterArc((REDONDEO1_R, -REDONDEO1_R), REDONDEO1_R, 90, 90)
            Line((0, -REDONDEO1_R), (-REDONDEO1_R * 0.02, -REDONDEO1_R))
            Line((-REDONDEO1_R * 0.02, -REDONDEO1_R), (-REDONDEO1_R * 0.02, REDONDEO1_R * 0.02))
            Line((-REDONDEO1_R * 0.02, REDONDEO1_R * 0.02), (REDONDEO1_R, REDONDEO1_R * 0.02))
            Line((REDONDEO1_R, REDONDEO1_R * 0.02), (REDONDEO1_R, 0))
        make_face()
    redondeo1_piece_17a = extrude(amount=32.5, mode=Mode.PRIVATE)
    redondeo1_piece_17a = split(redondeo1_piece_17a, bisect_by=Plane(origin=(23.773604886, 10, 23.773604886), z_dir=(0, 1, 0)), keep=Keep.TOP, mode=Mode.PRIVATE)
    with BuildSketch(Plane(origin=(24, 10, -1.5), x_dir=(-1, 0, 0), z_dir=(0, 0, 1))) as redondeo1_piece_17b_section:
        with BuildLine():
            CenterArc((REDONDEO1_R, REDONDEO1_R), REDONDEO1_R, 180, 90)
            Line((0, REDONDEO1_R), (-REDONDEO1_R * 0.02, REDONDEO1_R))
            Line((-REDONDEO1_R * 0.02, REDONDEO1_R), (-REDONDEO1_R * 0.02, -REDONDEO1_R * 0.02))
            Line((-REDONDEO1_R * 0.02, -REDONDEO1_R * 0.02), (REDONDEO1_R, -REDONDEO1_R * 0.02))
            Line((REDONDEO1_R, -REDONDEO1_R * 0.02), (REDONDEO1_R, 0))
        make_face()
    redondeo1_piece_17b = extrude(amount=28, mode=Mode.PRIVATE)
    redondeo1_piece_17b = split(redondeo1_piece_17b, bisect_by=Plane(origin=(23.773604886, 9.773604886, 24), z_dir=(0, 0, 1)), keep=Keep.TOP, mode=Mode.PRIVATE)
    redondeo1_piece_17 = redondeo1_piece_17a & redondeo1_piece_17b
    add(redondeo1_piece_17, mode=Mode.SUBTRACT)
    with BuildSketch(Plane(origin=(24, -20, 24), x_dir=(0, 1, 0), z_dir=(0, 0, -1))) as redondeo1_piece_18a_section:
        with BuildLine():
            CenterArc((REDONDEO1_R, -REDONDEO1_R), REDONDEO1_R, 90, 90)
            Line((0, -REDONDEO1_R), (-REDONDEO1_R * 0.02, -REDONDEO1_R))
            Line((-REDONDEO1_R * 0.02, -REDONDEO1_R), (-REDONDEO1_R * 0.02, REDONDEO1_R * 0.02))
            Line((-REDONDEO1_R * 0.02, REDONDEO1_R * 0.02), (REDONDEO1_R, REDONDEO1_R * 0.02))
            Line((REDONDEO1_R, REDONDEO1_R * 0.02), (REDONDEO1_R, 0))
        make_face()
    redondeo1_piece_18a = extrude(amount=26.5, mode=Mode.PRIVATE)
    redondeo1_piece_18a = split(redondeo1_piece_18a, bisect_by=Plane(origin=(23.773604886, -19.773604886, 0), z_dir=(0, 0, -1)), keep=Keep.TOP, mode=Mode.PRIVATE)
    with BuildSketch(Plane(origin=(24, -22.5, 0), x_dir=(0, 0, 1), z_dir=(0, 1, 0))) as redondeo1_piece_18b_section:
        with BuildLine():
            CenterArc((REDONDEO1_R, -REDONDEO1_R), REDONDEO1_R, 90, 90)
            Line((0, -REDONDEO1_R), (-REDONDEO1_R * 0.02, -REDONDEO1_R))
            Line((-REDONDEO1_R * 0.02, -REDONDEO1_R), (-REDONDEO1_R * 0.02, REDONDEO1_R * 0.02))
            Line((-REDONDEO1_R * 0.02, REDONDEO1_R * 0.02), (REDONDEO1_R, REDONDEO1_R * 0.02))
            Line((REDONDEO1_R, REDONDEO1_R * 0.02), (REDONDEO1_R, 0))
        make_face()
    redondeo1_piece_18b = extrude(amount=15, mode=Mode.PRIVATE)
    redondeo1_piece_18b = split(redondeo1_piece_18b, bisect_by=Plane(origin=(23.773604886, -20, 0.226395114), z_dir=(0, -1, 0)), keep=Keep.TOP, mode=Mode.PRIVATE)
    redondeo1_piece_18 = redondeo1_piece_18a & redondeo1_piece_18b
    add(redondeo1_piece_18, mode=Mode.SUBTRACT)
    with BuildSketch(Plane(origin=(24, -12.496880847, -0.124844042), x_dir=(-1, 0, 0), z_dir=(0, 0.9987523388778446, 0.049937616943892635))) as redondeo1_piece_19a_section:
        with BuildLine():
            CenterArc((REDONDEO1_R, REDONDEO1_R), REDONDEO1_R, 180, 90)
            Line((0, REDONDEO1_R), (-REDONDEO1_R * 0.02, REDONDEO1_R))
            Line((-REDONDEO1_R * 0.02, REDONDEO1_R), (-REDONDEO1_R * 0.02, -REDONDEO1_R * 0.02))
            Line((-REDONDEO1_R * 0.02, -REDONDEO1_R * 0.02), (REDONDEO1_R, -REDONDEO1_R * 0.02))
            Line((REDONDEO1_R, -REDONDEO1_R * 0.02), (REDONDEO1_R, 0))
        make_face()
    redondeo1_piece_19a = extrude(amount=25.024984395, mode=Mode.PRIVATE)
    redondeo1_piece_19a = split(redondeo1_piece_19a, bisect_by=Plane(origin=(23.594544585, -11.473288765, 0), z_dir=(0, 0, -1)), keep=Keep.TOP, mode=Mode.PRIVATE)
    with BuildSketch(Plane(origin=(24, -20, 0), x_dir=(0, 0, 1), z_dir=(0, 1, 0))) as redondeo1_piece_19b_section:
        with BuildLine():
            CenterArc((REDONDEO1_R, -REDONDEO1_R), REDONDEO1_R, 90, 90)
            Line((0, -REDONDEO1_R), (-REDONDEO1_R * 0.02, -REDONDEO1_R))
            Line((-REDONDEO1_R * 0.02, -REDONDEO1_R), (-REDONDEO1_R * 0.02, REDONDEO1_R * 0.02))
            Line((-REDONDEO1_R * 0.02, REDONDEO1_R * 0.02), (REDONDEO1_R, REDONDEO1_R * 0.02))
            Line((REDONDEO1_R, REDONDEO1_R * 0.02), (REDONDEO1_R, 0))
        make_face()
    redondeo1_piece_19b = extrude(amount=12.5, mode=Mode.PRIVATE)
    redondeo1_piece_19b = split(redondeo1_piece_19b, bisect_by=Plane(origin=(23.594544585, -8.528549401, 0.07357253), z_dir=(0, 0.049937616943892635, -0.9987523388778446)), keep=Keep.TOP, mode=Mode.PRIVATE)
    redondeo1_piece_19 = redondeo1_piece_19a & redondeo1_piece_19b
    add(redondeo1_piece_19, mode=Mode.SUBTRACT)
    with BuildSketch(Plane(origin=(24, -12.496880847, -0.124844042), x_dir=(-1, 0, 0), z_dir=(0, 0.9987523388778446, 0.049937616943892635))) as redondeo1_piece_20a_section:
        with BuildLine():
            CenterArc((REDONDEO1_R, REDONDEO1_R), REDONDEO1_R, 180, 90)
            Line((0, REDONDEO1_R), (-REDONDEO1_R * 0.02, REDONDEO1_R))
            Line((-REDONDEO1_R * 0.02, REDONDEO1_R), (-REDONDEO1_R * 0.02, -REDONDEO1_R * 0.02))
            Line((-REDONDEO1_R * 0.02, -REDONDEO1_R * 0.02), (REDONDEO1_R, -REDONDEO1_R * 0.02))
            Line((REDONDEO1_R, -REDONDEO1_R * 0.02), (REDONDEO1_R, 0))
        make_face()
    redondeo1_piece_20a = extrude(amount=25.024984395, mode=Mode.PRIVATE)
    redondeo1_piece_20a = split(redondeo1_piece_20a, bisect_by=Plane(origin=(23.773053254, 10, 1.287883551), z_dir=(0, 1, 0)), keep=Keep.TOP, mode=Mode.PRIVATE)
    with BuildSketch(Plane(origin=(24, 10, -1.5), x_dir=(-1, 0, 0), z_dir=(0, 0, 1))) as redondeo1_piece_20b_section:
        with BuildLine():
            CenterArc((REDONDEO1_R, REDONDEO1_R), REDONDEO1_R, 180, 90)
            Line((0, REDONDEO1_R), (-REDONDEO1_R * 0.02, REDONDEO1_R))
            Line((-REDONDEO1_R * 0.02, REDONDEO1_R), (-REDONDEO1_R * 0.02, -REDONDEO1_R * 0.02))
            Line((-REDONDEO1_R * 0.02, -REDONDEO1_R * 0.02), (REDONDEO1_R, -REDONDEO1_R * 0.02))
            Line((REDONDEO1_R, -REDONDEO1_R * 0.02), (REDONDEO1_R, 0))
        make_face()
    redondeo1_piece_20b = extrude(amount=25.5, mode=Mode.PRIVATE)
    redondeo1_piece_20b = split(redondeo1_piece_20b, bisect_by=Plane(origin=(23.773053254, 9.71247563, 0.985623782), z_dir=(0, 0.049937616943892635, -0.9987523388778446)), keep=Keep.TOP, mode=Mode.PRIVATE)
    redondeo1_piece_20 = redondeo1_piece_20a & redondeo1_piece_20b
    add(redondeo1_piece_20, mode=Mode.SUBTRACT)
    with BuildSketch(Plane(origin=(7, -33.3, 24), x_dir=(-1, 0, 0), z_dir=(0, 1, 0))) as redondeo1_piece_21a_section:
        with BuildLine():
            CenterArc((REDONDEO1_R, -REDONDEO1_R), REDONDEO1_R, 90, 90)
            Line((0, -REDONDEO1_R), (-REDONDEO1_R * 0.02, -REDONDEO1_R))
            Line((-REDONDEO1_R * 0.02, -REDONDEO1_R), (-REDONDEO1_R * 0.02, REDONDEO1_R * 0.02))
            Line((-REDONDEO1_R * 0.02, REDONDEO1_R * 0.02), (REDONDEO1_R, REDONDEO1_R * 0.02))
            Line((REDONDEO1_R, REDONDEO1_R * 0.02), (REDONDEO1_R, 0))
        make_face()
    redondeo1_piece_21a = extrude(amount=25.8, mode=Mode.PRIVATE)
    redondeo1_piece_21a = split(redondeo1_piece_21a, bisect_by=Plane(origin=(6.773604886, -10, 23.773604886), z_dir=(0, 1, 0)), keep=Keep.TOP, mode=Mode.PRIVATE)
    with BuildSketch(Plane(origin=(4.5, -10, 24), x_dir=(0, 1, 0), z_dir=(1, 0, 0))) as redondeo1_piece_21b_section:
        with BuildLine():
            CenterArc((REDONDEO1_R, -REDONDEO1_R), REDONDEO1_R, 90, 90)
            Line((0, -REDONDEO1_R), (-REDONDEO1_R * 0.02, -REDONDEO1_R))
            Line((-REDONDEO1_R * 0.02, -REDONDEO1_R), (-REDONDEO1_R * 0.02, REDONDEO1_R * 0.02))
            Line((-REDONDEO1_R * 0.02, REDONDEO1_R * 0.02), (REDONDEO1_R, REDONDEO1_R * 0.02))
            Line((REDONDEO1_R, REDONDEO1_R * 0.02), (REDONDEO1_R, 0))
        make_face()
    redondeo1_piece_21b = extrude(amount=16.5, mode=Mode.PRIVATE)
    redondeo1_piece_21b = split(redondeo1_piece_21b, bisect_by=Plane(origin=(7, -9.773604886, 23.773604886), z_dir=(-1, 0, 0)), keep=Keep.TOP, mode=Mode.PRIVATE)
    redondeo1_piece_21 = redondeo1_piece_21a & redondeo1_piece_21b
    add(redondeo1_piece_21, mode=Mode.SUBTRACT)
    with BuildSketch(Plane(origin=(0, -33.3, -7), x_dir=(0, 1, 0), z_dir=(0, 0, 1))) as redondeo1_piece_22a_section:
        with BuildLine():
            CenterArc((REDONDEO1_R, REDONDEO1_R), REDONDEO1_R, 180, 90)
            Line((0, REDONDEO1_R), (-REDONDEO1_R * 0.02, REDONDEO1_R))
            Line((-REDONDEO1_R * 0.02, REDONDEO1_R), (-REDONDEO1_R * 0.02, -REDONDEO1_R * 0.02))
            Line((-REDONDEO1_R * 0.02, -REDONDEO1_R * 0.02), (REDONDEO1_R, -REDONDEO1_R * 0.02))
            Line((REDONDEO1_R, -REDONDEO1_R * 0.02), (REDONDEO1_R, 0))
        make_face()
    redondeo1_piece_22a = extrude(amount=9.5, mode=Mode.PRIVATE)
    redondeo1_piece_22a = split(redondeo1_piece_22a, bisect_by=Plane(origin=(-0.226395114, -33.073604886, 0), z_dir=(0, 0, 1)), keep=Keep.TOP, mode=Mode.PRIVATE)
    with BuildSketch(Plane(origin=(0, -30.8, 0), x_dir=(0, 0, 1), z_dir=(0, -1, 0))) as redondeo1_piece_22b_section:
        with BuildLine():
            CenterArc((REDONDEO1_R, REDONDEO1_R), REDONDEO1_R, 180, 90)
            Line((0, REDONDEO1_R), (-REDONDEO1_R * 0.02, REDONDEO1_R))
            Line((-REDONDEO1_R * 0.02, REDONDEO1_R), (-REDONDEO1_R * 0.02, -REDONDEO1_R * 0.02))
            Line((-REDONDEO1_R * 0.02, -REDONDEO1_R * 0.02), (REDONDEO1_R, -REDONDEO1_R * 0.02))
            Line((REDONDEO1_R, -REDONDEO1_R * 0.02), (REDONDEO1_R, 0))
        make_face()
    redondeo1_piece_22b = extrude(amount=13.5, mode=Mode.PRIVATE)
    redondeo1_piece_22b = split(redondeo1_piece_22b, bisect_by=Plane(origin=(-0.226395114, -33.3, 0.226395114), z_dir=(0, 1, 0)), keep=Keep.TOP, mode=Mode.PRIVATE)
    redondeo1_piece_22 = redondeo1_piece_22a & redondeo1_piece_22b
    add(redondeo1_piece_22, mode=Mode.SUBTRACT)
    with BuildSketch(Plane(origin=(0, -33.3, 0), x_dir=(0, 0, 1), z_dir=(0, -1, 0))) as redondeo1_piece_23a_section:
        with BuildLine():
            CenterArc((REDONDEO1_R, REDONDEO1_R), REDONDEO1_R, 180, 90)
            Line((0, REDONDEO1_R), (-REDONDEO1_R * 0.02, REDONDEO1_R))
            Line((-REDONDEO1_R * 0.02, REDONDEO1_R), (-REDONDEO1_R * 0.02, -REDONDEO1_R * 0.02))
            Line((-REDONDEO1_R * 0.02, -REDONDEO1_R * 0.02), (REDONDEO1_R, -REDONDEO1_R * 0.02))
            Line((REDONDEO1_R, -REDONDEO1_R * 0.02), (REDONDEO1_R, 0))
        make_face()
    redondeo1_piece_23a = extrude(amount=13.5, mode=Mode.PRIVATE)
    redondeo1_piece_23a = split(redondeo1_piece_23a, bisect_by=Plane(origin=(-0.226395114, -44.3, 0.226395114), z_dir=(0, -1, 0)), keep=Keep.TOP, mode=Mode.PRIVATE)
    with BuildSketch(Plane(origin=(0, -44.3, -2.5), x_dir=(0, 1, 0), z_dir=(0, 0, 1))) as redondeo1_piece_23b_section:
        with BuildLine():
            CenterArc((REDONDEO1_R, REDONDEO1_R), REDONDEO1_R, 180, 90)
            Line((0, REDONDEO1_R), (-REDONDEO1_R * 0.02, REDONDEO1_R))
            Line((-REDONDEO1_R * 0.02, REDONDEO1_R), (-REDONDEO1_R * 0.02, -REDONDEO1_R * 0.02))
            Line((-REDONDEO1_R * 0.02, -REDONDEO1_R * 0.02), (REDONDEO1_R, -REDONDEO1_R * 0.02))
            Line((REDONDEO1_R, -REDONDEO1_R * 0.02), (REDONDEO1_R, 0))
        make_face()
    redondeo1_piece_23b = extrude(amount=26.5, mode=Mode.PRIVATE)
    redondeo1_piece_23b = split(redondeo1_piece_23b, bisect_by=Plane(origin=(-0.226395114, -44.073604886, 0), z_dir=(0, 0, -1)), keep=Keep.TOP, mode=Mode.PRIVATE)
    redondeo1_piece_23 = redondeo1_piece_23a & redondeo1_piece_23b
    add(redondeo1_piece_23, mode=Mode.SUBTRACT)

    # Croquis19 → Cortar-Extruir11 (cut, through all)
    with BuildSketch(Plane(origin=(0, -44.3, 0), x_dir=(-1, 0, 0), z_dir=(0, -1, 0))):
        with Locations((-10.5, -21.5)):
            Rectangle(CROQUIS19_W, CROQUIS19_H)
    extrude(amount=-CORTAR_EXTRUIR11_DEPTH, mode=Mode.SUBTRACT)

    # Croquis21 → Cortar-Extruir12 (cut)
    with BuildSketch(Plane(origin=(0, 0, 0), x_dir=(-1, 0, 0), z_dir=(0, 0, -1))):
        with Locations((-5.52, -14.3)):
            Circle(CROQUIS21_R)
    extrude(amount=-CORTAR_EXTRUIR12_DEPTH, mode=Mode.SUBTRACT)

    # Croquis22 → Cortar-Extruir13 (cut, through all)
    with BuildSketch(Plane(origin=(0, 0, 0), x_dir=(0, 0, -1), z_dir=(1, 0, 0))):
        with Locations((-6, -38.8)):
            Rectangle(CROQUIS22_W, CROQUIS22_H)
    extrude(amount=-CORTAR_EXTRUIR13_DEPTH, mode=Mode.SUBTRACT)


solid = part_1.part
